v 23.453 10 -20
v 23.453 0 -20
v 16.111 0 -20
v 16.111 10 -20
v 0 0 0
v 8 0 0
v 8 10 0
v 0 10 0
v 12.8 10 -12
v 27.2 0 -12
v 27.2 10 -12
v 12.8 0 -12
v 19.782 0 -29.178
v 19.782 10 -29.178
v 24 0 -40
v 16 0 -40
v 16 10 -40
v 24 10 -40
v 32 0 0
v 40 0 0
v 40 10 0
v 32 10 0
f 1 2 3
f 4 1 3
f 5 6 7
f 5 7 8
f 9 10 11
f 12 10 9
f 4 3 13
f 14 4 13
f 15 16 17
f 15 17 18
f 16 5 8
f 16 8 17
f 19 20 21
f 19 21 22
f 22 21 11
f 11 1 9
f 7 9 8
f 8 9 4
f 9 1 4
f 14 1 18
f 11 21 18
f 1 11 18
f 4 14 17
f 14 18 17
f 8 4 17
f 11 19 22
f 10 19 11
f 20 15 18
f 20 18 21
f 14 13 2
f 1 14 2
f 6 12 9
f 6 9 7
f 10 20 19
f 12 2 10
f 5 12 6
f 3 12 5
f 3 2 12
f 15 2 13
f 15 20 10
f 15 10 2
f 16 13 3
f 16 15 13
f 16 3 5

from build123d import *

# Parameters (mm, degrees)
BOSS_EXTRUDE1_DEPTH = 10


with BuildPart() as part:
    # Sketch1 → Boss-Extrude1 (new body)
    with BuildSketch(Plane(origin=(0, 0, 0), x_dir=(1, 0, 0), z_dir=(0, 1, 0))):
        Polygon((0, 0), (16, 40), (24, 40), (40, 0), (32, 0), (27.2, 12), (12.8, 12), (8, 0), align=None)
        Polygon((16.110598883, 20), (19.781948191, 29.17837327), (23.453297499, 20), align=None, mode=Mode.SUBTRACT)
    extrude(amount=BOSS_EXTRUDE1_DEPTH)


solid = part.part
